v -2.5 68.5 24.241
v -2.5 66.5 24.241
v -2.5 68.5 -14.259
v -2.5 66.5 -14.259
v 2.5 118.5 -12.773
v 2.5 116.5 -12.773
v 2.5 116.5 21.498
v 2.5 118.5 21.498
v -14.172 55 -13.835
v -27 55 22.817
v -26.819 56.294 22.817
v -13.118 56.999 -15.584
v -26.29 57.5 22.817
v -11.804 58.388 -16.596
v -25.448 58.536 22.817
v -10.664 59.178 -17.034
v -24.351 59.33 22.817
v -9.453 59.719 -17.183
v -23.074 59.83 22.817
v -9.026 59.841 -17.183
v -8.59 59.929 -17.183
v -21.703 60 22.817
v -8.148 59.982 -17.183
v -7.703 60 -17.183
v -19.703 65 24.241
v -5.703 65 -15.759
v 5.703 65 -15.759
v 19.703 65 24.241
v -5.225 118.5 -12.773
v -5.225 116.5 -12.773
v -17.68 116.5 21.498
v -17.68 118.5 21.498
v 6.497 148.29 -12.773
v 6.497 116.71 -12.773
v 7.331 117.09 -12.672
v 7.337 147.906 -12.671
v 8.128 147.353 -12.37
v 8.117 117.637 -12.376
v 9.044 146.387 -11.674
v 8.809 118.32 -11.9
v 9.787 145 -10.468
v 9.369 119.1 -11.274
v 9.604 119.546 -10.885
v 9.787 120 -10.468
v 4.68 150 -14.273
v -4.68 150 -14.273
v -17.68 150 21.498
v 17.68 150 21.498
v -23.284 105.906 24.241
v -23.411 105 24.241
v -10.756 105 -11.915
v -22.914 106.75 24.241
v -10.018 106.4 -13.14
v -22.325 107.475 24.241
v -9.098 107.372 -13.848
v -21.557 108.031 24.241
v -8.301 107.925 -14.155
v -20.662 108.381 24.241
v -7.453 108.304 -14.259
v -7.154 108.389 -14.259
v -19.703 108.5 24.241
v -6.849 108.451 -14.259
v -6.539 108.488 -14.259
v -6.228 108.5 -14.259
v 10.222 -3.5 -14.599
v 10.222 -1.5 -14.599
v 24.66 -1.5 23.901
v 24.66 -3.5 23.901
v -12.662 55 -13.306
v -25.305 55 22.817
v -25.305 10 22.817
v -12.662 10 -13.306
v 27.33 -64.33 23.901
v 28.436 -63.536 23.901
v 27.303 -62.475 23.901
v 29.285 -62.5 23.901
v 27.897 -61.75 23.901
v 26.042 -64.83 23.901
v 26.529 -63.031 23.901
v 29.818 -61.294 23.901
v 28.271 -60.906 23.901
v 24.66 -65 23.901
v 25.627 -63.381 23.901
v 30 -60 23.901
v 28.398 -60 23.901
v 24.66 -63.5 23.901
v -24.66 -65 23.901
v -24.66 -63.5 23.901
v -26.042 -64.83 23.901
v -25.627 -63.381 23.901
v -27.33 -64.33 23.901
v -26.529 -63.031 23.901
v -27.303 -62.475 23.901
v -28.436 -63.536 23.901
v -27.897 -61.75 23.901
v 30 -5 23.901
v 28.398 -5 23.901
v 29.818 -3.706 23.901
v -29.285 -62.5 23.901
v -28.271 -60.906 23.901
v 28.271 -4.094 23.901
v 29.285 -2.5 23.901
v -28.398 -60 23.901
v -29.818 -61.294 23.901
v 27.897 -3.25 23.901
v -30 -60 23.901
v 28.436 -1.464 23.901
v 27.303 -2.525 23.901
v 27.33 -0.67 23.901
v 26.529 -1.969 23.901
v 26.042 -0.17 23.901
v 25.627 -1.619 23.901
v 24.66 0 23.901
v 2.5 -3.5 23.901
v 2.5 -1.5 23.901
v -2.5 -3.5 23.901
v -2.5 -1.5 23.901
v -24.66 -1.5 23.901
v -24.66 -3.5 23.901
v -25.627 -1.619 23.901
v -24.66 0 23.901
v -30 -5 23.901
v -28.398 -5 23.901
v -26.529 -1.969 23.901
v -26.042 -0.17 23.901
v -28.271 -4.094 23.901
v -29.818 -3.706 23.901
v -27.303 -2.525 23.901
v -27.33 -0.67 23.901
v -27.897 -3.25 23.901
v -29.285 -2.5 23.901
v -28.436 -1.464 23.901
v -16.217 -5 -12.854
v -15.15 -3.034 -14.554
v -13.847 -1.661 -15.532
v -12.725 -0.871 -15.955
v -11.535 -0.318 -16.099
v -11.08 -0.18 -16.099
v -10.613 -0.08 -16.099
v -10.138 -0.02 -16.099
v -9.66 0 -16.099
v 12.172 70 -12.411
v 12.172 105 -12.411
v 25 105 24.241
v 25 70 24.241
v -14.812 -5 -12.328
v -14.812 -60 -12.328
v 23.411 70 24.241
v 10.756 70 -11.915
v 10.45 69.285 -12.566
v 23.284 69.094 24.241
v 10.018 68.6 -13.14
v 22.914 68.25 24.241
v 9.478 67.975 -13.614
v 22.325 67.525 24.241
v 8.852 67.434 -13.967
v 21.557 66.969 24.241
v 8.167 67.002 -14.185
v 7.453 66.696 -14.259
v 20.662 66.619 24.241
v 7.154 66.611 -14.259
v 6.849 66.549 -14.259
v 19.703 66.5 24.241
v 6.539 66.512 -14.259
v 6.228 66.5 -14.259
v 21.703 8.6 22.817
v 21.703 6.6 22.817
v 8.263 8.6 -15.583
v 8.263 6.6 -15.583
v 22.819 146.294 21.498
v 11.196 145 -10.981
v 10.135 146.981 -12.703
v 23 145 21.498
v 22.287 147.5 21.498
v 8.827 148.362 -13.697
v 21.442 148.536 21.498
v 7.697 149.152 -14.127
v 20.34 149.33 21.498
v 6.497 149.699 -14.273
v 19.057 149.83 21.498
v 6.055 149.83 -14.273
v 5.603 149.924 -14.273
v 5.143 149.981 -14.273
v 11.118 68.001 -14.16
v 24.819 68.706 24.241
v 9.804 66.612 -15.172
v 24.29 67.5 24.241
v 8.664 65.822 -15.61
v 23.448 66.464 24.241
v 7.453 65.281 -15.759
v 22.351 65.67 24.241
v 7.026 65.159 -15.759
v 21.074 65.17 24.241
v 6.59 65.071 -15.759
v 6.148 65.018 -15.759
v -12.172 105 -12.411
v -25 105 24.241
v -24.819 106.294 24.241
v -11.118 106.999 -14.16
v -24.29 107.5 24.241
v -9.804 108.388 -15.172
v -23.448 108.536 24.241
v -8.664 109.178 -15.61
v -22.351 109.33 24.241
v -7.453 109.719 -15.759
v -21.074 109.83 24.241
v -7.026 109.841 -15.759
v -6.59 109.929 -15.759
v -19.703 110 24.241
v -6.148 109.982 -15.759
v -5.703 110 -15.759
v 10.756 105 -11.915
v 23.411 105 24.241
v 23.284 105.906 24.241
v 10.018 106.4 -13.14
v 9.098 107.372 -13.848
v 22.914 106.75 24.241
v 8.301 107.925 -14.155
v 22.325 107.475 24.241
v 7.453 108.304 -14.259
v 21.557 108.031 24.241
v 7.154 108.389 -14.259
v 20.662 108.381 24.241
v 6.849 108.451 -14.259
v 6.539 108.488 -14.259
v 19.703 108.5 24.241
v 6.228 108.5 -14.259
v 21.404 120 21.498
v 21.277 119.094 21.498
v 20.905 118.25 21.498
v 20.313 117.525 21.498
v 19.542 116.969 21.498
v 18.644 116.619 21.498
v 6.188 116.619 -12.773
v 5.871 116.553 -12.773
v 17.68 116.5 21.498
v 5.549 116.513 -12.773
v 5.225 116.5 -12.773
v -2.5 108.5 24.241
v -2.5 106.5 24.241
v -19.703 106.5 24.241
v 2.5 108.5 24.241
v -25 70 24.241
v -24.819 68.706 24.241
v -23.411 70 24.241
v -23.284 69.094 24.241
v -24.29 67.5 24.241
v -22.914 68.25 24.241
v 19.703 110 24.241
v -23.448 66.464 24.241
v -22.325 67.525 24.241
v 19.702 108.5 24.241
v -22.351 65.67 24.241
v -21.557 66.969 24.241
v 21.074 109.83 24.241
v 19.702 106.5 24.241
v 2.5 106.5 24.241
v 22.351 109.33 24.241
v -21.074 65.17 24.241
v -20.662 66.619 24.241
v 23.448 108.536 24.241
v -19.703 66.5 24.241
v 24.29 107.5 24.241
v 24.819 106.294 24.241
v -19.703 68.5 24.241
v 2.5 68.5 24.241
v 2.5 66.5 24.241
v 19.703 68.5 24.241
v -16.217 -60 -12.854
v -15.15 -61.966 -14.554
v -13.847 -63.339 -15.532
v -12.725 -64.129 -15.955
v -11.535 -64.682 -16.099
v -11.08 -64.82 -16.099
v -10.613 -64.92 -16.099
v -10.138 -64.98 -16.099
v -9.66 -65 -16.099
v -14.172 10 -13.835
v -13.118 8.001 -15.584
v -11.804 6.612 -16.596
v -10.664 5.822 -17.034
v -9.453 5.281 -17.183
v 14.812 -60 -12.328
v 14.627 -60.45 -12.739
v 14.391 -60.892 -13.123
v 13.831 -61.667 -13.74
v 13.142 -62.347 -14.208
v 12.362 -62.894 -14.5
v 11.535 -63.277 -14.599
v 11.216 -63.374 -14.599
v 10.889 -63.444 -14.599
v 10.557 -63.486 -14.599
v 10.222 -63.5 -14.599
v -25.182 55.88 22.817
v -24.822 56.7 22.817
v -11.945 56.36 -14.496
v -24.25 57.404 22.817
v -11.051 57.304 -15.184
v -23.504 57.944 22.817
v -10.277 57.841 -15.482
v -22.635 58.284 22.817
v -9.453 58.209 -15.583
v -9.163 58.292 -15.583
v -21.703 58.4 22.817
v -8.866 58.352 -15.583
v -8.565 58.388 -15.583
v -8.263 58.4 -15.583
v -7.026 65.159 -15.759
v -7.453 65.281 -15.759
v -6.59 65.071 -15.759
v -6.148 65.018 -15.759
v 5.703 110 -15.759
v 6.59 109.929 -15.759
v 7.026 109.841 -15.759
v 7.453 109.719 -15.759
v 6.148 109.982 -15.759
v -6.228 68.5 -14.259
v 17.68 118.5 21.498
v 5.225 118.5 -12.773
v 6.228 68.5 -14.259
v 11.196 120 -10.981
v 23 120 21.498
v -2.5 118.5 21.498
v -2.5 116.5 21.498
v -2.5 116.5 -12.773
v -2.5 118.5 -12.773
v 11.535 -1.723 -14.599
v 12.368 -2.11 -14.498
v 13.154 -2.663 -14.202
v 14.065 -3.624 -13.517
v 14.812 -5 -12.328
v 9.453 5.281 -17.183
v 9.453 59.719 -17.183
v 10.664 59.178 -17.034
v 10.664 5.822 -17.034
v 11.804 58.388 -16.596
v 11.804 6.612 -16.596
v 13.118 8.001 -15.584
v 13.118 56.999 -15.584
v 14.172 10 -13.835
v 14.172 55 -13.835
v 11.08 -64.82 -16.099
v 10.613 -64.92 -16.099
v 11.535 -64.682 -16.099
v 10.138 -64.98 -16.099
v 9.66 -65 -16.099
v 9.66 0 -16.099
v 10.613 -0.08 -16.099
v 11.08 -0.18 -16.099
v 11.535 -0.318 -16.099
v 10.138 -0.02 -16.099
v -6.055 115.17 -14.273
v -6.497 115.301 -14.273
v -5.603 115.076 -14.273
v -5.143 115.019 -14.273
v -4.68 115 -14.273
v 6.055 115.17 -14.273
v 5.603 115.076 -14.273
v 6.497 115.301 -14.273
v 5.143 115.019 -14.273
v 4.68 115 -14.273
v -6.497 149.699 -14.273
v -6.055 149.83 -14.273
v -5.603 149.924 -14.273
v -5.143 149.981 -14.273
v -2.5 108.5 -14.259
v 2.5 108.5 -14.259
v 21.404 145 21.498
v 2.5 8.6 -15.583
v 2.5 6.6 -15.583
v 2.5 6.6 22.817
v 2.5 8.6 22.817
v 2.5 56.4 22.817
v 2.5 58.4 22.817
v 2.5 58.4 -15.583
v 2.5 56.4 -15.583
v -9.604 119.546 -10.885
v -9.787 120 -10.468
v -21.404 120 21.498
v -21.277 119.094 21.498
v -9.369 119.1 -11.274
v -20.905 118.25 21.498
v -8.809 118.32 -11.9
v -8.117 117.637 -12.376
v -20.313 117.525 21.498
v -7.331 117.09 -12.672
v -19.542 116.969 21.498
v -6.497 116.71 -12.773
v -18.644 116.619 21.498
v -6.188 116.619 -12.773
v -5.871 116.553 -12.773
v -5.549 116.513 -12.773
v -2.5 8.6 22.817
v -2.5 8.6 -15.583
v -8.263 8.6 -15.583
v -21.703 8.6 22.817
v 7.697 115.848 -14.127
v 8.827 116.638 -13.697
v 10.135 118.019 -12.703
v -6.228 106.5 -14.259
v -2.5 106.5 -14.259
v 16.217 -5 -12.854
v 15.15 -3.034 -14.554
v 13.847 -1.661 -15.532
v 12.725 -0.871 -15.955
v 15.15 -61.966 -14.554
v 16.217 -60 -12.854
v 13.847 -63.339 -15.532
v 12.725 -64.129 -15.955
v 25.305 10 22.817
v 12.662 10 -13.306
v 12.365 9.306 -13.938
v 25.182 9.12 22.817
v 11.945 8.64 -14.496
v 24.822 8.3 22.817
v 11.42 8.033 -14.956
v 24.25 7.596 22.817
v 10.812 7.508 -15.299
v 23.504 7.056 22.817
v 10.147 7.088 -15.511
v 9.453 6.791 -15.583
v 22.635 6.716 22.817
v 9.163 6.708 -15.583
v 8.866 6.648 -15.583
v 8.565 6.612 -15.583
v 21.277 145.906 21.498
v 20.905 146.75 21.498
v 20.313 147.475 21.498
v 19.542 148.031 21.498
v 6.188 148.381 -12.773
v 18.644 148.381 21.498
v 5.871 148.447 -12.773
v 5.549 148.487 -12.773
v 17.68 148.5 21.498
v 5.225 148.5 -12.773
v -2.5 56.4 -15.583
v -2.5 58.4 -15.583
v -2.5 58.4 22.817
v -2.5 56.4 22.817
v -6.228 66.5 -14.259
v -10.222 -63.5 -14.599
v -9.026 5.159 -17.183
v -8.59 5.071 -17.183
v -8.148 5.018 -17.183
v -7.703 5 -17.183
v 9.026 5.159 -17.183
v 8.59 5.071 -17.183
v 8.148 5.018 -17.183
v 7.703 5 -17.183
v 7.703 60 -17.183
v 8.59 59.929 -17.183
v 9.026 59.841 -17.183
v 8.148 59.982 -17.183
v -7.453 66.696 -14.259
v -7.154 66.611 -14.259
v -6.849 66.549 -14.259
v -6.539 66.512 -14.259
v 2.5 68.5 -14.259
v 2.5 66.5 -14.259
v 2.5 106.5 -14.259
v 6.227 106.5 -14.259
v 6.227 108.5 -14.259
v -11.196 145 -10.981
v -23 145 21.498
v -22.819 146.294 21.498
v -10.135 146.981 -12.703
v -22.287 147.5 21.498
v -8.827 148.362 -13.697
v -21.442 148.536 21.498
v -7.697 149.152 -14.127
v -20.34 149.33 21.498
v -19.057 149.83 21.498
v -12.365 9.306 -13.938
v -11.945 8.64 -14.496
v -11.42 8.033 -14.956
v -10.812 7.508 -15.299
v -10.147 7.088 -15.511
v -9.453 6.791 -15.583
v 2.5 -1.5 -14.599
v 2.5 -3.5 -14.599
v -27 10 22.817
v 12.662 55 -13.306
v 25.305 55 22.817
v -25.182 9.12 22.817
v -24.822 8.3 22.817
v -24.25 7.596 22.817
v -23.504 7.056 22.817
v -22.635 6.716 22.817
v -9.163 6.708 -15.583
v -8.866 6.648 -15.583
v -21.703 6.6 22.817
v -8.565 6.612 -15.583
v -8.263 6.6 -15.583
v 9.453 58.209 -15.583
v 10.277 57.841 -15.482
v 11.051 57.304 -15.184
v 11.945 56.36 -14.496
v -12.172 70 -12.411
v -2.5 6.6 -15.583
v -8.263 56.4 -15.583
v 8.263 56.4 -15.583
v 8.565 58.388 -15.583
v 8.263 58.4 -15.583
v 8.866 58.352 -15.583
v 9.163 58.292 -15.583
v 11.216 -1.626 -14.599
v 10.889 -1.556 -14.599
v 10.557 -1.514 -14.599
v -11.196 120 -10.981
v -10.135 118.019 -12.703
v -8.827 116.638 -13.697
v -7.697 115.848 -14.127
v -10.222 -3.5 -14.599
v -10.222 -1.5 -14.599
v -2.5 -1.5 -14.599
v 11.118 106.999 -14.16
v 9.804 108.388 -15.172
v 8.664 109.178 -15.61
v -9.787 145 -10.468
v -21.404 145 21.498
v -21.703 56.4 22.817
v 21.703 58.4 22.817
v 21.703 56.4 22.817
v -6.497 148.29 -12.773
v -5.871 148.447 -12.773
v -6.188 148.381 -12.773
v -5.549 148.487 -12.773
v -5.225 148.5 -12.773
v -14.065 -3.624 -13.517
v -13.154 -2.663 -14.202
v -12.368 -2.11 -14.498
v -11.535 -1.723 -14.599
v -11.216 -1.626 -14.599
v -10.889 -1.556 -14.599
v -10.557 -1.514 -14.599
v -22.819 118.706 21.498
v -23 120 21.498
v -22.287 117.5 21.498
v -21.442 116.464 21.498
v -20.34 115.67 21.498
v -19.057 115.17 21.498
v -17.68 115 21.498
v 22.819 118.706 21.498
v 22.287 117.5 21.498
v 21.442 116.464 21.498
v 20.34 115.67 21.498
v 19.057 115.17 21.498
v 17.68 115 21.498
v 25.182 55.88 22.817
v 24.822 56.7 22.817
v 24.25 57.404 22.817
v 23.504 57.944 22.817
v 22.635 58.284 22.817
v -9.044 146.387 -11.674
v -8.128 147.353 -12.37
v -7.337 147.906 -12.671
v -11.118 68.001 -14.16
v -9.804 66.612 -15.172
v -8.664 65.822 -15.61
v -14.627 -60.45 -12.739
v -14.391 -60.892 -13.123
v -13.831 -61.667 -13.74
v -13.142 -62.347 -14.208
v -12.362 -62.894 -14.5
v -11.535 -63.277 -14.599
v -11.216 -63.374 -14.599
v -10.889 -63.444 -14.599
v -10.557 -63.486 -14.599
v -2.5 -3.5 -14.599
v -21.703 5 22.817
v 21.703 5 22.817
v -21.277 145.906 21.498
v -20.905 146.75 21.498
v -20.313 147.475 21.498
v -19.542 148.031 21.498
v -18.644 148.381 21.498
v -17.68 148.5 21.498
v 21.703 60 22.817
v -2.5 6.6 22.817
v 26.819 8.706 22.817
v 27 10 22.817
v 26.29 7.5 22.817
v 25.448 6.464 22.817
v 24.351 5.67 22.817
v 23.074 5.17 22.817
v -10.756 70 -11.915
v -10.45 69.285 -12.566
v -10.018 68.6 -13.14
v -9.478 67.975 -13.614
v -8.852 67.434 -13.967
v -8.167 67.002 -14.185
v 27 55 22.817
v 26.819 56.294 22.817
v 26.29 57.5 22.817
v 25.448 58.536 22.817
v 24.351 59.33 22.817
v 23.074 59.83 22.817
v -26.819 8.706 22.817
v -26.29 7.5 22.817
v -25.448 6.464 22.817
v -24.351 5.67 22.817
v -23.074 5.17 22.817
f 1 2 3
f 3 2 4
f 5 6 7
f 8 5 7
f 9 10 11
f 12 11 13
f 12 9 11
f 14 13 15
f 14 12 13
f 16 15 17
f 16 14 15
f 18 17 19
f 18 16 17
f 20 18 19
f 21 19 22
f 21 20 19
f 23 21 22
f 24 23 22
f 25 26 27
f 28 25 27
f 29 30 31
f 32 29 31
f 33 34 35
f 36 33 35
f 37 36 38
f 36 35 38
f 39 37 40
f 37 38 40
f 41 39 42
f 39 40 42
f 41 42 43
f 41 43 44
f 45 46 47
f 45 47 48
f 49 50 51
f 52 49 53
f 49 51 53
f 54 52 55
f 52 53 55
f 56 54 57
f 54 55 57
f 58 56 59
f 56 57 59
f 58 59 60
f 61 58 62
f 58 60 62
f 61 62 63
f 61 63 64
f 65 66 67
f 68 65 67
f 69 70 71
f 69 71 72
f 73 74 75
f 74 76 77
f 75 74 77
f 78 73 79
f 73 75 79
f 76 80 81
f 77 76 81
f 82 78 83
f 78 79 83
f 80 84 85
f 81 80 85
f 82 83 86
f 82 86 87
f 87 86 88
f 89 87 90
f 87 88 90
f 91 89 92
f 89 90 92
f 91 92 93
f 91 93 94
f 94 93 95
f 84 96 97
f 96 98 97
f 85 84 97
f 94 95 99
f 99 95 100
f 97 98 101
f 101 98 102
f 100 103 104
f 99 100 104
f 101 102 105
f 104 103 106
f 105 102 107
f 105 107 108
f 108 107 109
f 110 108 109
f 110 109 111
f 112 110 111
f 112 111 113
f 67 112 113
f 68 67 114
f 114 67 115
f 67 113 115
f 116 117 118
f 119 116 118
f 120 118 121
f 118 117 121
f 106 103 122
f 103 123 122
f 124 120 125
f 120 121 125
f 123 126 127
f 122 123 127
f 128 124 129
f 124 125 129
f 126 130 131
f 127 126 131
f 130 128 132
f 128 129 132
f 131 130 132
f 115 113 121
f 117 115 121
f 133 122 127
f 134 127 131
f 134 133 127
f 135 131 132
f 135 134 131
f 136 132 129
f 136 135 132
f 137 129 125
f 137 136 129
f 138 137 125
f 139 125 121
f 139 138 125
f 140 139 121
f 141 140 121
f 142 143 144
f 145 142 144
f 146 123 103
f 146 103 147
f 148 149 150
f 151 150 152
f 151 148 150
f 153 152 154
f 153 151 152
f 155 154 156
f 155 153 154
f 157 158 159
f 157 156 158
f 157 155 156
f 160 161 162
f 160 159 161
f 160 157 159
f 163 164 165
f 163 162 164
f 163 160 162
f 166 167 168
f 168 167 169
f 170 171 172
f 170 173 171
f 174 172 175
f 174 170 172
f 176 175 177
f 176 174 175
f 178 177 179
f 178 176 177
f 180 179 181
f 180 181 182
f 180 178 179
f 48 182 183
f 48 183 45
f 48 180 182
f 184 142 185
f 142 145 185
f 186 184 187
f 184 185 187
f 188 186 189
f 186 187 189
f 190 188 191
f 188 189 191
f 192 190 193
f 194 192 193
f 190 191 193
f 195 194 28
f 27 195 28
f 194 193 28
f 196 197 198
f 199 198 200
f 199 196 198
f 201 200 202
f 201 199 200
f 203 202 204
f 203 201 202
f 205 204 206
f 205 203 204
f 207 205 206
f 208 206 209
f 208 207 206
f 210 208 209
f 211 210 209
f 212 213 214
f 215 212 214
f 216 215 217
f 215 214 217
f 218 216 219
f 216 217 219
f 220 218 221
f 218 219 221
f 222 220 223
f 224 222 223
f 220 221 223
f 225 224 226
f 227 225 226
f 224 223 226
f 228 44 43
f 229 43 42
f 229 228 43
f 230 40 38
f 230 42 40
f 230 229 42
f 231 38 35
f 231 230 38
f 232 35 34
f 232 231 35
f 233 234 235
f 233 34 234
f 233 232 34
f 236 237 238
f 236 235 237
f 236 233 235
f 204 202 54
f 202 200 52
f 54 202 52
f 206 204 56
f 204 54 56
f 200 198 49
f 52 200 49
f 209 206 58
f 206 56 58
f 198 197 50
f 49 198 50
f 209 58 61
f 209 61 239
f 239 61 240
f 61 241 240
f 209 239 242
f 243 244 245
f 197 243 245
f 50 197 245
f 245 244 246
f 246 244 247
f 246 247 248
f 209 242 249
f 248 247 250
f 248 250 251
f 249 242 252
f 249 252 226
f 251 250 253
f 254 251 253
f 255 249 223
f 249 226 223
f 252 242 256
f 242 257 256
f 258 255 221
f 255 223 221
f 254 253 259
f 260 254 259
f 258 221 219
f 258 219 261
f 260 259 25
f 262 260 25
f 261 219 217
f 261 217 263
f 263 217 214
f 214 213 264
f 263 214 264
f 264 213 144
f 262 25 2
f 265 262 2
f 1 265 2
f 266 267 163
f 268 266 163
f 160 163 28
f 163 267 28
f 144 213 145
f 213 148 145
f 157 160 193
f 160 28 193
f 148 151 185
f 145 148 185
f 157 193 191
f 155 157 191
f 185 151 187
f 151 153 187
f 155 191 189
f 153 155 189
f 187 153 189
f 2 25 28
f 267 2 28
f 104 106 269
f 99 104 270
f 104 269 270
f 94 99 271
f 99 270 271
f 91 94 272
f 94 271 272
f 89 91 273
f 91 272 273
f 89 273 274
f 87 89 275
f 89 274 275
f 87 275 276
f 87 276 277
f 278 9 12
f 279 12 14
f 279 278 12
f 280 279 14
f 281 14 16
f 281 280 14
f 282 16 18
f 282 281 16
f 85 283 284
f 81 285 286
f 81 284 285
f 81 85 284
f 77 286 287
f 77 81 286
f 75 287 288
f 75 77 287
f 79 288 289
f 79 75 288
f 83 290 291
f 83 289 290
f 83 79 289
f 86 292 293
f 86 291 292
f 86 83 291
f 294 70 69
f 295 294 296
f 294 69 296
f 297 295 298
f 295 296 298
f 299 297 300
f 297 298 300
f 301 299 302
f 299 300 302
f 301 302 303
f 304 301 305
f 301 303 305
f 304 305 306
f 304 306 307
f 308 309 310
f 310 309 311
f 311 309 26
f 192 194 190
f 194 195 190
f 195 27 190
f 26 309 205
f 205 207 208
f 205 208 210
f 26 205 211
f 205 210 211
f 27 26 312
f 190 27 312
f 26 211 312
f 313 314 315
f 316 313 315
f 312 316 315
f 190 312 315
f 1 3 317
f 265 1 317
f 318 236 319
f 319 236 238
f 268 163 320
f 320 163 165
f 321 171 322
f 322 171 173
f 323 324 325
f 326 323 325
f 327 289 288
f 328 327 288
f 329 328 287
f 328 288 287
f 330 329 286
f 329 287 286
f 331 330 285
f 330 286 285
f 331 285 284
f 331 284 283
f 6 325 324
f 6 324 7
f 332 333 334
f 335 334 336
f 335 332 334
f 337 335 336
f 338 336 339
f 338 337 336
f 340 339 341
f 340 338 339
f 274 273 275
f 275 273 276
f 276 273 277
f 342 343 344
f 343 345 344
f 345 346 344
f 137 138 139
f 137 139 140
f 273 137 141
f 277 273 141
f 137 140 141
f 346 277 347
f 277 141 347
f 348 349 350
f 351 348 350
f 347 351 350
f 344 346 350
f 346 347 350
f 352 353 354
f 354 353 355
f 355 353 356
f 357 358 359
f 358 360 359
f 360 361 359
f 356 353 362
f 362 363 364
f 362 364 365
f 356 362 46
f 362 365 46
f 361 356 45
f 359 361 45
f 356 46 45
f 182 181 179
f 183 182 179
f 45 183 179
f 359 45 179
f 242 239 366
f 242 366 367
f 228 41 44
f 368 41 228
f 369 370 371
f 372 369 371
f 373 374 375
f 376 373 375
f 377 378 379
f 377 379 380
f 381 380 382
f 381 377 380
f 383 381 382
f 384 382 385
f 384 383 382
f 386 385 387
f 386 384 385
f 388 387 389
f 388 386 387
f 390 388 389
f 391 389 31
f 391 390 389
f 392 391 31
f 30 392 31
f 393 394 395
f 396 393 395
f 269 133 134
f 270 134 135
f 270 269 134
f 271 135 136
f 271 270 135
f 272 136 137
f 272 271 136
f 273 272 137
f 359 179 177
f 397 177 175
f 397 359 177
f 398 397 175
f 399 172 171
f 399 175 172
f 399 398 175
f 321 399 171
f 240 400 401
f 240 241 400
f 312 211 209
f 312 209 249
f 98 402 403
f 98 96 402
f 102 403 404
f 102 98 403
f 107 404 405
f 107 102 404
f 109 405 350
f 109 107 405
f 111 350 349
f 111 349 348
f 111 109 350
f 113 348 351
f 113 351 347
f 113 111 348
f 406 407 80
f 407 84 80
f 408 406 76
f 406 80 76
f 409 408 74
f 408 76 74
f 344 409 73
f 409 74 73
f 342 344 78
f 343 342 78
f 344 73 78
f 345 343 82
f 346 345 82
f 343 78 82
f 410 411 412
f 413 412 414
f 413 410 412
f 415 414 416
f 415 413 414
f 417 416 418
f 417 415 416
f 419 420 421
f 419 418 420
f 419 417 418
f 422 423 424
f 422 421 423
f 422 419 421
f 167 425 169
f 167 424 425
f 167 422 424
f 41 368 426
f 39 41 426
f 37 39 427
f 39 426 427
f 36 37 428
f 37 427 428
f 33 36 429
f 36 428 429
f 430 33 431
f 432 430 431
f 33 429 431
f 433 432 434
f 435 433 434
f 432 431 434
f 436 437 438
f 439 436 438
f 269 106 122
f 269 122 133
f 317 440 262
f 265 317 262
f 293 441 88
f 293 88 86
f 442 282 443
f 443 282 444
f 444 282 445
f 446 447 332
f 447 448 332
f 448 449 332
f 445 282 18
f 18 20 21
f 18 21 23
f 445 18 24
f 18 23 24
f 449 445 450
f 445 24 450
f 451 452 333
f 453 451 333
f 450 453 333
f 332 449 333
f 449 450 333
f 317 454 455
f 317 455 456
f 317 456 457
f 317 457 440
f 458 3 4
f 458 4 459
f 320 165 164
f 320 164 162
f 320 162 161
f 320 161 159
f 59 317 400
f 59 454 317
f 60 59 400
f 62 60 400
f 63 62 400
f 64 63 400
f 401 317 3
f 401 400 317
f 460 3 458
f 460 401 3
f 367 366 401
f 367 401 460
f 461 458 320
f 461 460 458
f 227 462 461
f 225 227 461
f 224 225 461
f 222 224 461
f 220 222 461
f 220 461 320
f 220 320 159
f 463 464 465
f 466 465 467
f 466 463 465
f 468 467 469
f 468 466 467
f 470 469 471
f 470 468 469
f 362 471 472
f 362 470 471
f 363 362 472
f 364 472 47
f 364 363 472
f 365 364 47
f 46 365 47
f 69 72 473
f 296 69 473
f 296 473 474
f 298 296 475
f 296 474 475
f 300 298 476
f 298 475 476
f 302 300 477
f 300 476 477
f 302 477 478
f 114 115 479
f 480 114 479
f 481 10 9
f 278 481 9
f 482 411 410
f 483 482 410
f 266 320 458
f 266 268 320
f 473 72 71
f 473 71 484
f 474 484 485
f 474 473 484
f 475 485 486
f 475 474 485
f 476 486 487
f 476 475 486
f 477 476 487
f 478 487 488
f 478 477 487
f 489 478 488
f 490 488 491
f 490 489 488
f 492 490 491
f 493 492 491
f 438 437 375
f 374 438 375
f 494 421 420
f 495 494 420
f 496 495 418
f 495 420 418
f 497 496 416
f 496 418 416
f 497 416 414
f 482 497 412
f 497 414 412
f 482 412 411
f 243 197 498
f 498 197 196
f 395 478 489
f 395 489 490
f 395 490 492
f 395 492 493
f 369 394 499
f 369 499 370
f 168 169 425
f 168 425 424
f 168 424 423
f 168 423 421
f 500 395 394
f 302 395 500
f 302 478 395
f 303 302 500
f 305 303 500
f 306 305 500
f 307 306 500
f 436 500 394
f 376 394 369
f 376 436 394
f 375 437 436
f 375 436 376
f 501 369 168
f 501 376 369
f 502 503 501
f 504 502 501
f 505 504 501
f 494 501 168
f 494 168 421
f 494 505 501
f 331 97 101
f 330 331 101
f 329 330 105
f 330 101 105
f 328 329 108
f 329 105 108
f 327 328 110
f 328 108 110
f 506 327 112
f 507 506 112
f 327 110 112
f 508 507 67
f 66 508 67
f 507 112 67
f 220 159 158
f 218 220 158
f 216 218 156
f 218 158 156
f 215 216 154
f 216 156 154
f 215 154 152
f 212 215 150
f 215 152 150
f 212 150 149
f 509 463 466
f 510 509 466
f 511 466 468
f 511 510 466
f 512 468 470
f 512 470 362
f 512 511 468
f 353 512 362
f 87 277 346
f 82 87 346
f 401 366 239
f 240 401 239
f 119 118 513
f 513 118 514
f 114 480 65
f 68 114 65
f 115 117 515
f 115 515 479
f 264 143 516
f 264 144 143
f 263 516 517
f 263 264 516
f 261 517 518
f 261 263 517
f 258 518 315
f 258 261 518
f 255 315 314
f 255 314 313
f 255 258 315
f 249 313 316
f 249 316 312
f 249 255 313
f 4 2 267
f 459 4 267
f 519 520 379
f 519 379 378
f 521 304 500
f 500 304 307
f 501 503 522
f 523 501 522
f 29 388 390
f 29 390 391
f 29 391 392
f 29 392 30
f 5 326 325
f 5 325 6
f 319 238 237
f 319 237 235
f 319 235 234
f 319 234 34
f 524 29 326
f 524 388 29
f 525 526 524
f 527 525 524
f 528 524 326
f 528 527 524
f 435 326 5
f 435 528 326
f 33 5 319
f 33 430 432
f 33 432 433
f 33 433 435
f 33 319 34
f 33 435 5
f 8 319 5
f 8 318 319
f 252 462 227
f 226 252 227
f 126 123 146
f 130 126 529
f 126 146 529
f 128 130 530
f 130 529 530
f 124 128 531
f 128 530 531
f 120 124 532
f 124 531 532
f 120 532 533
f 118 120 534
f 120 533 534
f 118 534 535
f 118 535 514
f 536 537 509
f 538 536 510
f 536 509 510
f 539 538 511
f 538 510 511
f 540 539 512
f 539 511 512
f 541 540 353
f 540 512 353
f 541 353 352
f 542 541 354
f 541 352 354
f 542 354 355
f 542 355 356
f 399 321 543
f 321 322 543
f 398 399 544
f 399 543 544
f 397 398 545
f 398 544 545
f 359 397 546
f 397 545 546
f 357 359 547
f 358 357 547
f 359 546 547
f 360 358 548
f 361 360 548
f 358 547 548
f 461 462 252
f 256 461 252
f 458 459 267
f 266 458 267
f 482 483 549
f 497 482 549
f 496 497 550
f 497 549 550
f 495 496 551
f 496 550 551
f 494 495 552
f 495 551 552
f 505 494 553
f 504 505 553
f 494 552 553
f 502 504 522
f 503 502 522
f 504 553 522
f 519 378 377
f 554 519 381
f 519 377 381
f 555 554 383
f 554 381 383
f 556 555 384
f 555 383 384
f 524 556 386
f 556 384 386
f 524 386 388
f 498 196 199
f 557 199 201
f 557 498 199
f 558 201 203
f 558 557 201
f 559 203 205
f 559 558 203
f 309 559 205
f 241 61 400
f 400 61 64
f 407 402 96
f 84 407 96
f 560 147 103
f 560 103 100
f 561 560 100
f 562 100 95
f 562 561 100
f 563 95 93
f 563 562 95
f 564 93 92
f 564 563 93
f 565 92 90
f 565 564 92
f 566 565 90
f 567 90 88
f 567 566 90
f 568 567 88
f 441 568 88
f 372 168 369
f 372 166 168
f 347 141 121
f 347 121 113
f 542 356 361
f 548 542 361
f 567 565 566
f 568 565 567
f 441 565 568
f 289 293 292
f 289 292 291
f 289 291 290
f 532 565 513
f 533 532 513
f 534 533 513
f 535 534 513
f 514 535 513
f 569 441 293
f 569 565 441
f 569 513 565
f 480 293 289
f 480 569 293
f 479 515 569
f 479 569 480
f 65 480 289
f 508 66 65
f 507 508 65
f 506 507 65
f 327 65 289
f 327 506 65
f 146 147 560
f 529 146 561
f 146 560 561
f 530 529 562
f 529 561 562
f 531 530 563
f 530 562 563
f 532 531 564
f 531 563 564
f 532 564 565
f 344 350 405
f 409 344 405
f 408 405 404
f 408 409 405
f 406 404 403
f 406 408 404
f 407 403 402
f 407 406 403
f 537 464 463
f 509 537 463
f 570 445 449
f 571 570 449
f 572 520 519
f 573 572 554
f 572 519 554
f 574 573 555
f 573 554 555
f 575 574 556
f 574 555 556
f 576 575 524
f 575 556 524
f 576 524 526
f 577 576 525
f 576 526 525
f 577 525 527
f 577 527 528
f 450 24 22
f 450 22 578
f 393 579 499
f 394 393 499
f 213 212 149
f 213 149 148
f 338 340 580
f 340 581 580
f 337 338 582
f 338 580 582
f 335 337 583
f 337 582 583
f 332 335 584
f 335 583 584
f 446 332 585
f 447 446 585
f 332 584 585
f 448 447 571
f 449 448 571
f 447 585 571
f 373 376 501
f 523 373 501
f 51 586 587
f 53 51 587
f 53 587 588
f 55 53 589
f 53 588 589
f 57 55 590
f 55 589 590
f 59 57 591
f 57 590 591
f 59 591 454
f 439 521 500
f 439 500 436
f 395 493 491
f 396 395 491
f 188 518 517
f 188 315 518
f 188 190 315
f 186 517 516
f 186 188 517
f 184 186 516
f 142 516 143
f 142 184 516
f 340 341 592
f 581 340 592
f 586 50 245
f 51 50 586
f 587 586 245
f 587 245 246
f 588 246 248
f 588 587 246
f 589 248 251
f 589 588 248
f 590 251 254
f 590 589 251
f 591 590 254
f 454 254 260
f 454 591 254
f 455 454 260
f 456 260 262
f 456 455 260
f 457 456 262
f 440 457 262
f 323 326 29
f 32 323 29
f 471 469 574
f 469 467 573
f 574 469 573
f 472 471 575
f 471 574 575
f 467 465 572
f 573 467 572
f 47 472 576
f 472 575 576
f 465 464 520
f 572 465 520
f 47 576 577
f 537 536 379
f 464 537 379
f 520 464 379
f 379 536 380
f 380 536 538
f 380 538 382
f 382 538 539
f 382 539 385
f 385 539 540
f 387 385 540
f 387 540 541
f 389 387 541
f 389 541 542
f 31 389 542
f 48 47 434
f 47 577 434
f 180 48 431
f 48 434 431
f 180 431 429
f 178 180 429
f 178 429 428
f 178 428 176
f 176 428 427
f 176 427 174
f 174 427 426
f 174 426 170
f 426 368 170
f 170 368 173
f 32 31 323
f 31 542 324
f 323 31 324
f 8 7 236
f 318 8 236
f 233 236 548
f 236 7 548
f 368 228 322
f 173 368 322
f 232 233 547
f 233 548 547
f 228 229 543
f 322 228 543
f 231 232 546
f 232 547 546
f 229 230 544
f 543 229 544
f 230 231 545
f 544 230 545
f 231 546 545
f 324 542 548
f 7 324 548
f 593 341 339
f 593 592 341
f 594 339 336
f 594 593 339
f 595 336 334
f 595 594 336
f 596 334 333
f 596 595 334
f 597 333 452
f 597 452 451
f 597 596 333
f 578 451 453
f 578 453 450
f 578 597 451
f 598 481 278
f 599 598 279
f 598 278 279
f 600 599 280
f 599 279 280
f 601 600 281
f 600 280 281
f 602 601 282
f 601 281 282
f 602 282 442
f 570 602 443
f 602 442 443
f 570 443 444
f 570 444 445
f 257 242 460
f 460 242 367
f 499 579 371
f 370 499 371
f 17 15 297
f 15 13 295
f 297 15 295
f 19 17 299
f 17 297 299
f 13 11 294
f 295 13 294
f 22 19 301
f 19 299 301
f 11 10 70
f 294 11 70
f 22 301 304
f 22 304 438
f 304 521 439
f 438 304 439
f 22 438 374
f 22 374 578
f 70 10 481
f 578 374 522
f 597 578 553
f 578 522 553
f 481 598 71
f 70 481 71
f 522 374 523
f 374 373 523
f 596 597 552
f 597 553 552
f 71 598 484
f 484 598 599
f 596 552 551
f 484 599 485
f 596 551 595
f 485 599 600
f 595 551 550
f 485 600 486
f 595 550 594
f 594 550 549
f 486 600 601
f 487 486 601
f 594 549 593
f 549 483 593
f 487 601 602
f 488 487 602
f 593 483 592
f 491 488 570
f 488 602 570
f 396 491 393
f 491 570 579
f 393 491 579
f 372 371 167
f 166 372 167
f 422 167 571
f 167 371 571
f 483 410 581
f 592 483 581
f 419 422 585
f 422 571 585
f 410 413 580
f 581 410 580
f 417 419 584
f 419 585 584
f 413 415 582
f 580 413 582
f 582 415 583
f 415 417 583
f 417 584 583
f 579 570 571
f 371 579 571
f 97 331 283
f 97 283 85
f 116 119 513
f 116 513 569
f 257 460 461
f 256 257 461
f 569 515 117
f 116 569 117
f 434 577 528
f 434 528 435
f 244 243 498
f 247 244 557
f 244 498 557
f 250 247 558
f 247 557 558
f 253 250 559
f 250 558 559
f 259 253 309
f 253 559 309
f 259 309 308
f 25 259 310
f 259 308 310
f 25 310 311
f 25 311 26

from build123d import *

# Parameters (mm, degrees)
F1_DEPTH  = 65
F2_R      = 5
F5_DEPTH  = 55
F6_R      = 5
F9_DEPTH  = 45
F10_R     = 5
F13_DEPTH = 35
F14_R     = 5
F15_T     = -1.6
F16_T     = -1.5
F17_T     = -1.5
F18_T     = -1.5
F20_DEPTH = 2
F22_DEPTH = 2
F24_DEPTH = 2
F26_DEPTH = 2
F28_DEPTH = 2
F30_DEPTH = 2


with BuildPart() as f1:
    # F0 (on Front) → F1 (new body)
    with BuildSketch(Plane.XZ):
        Polygon((30, 23.901118), (0, 23.901118), (-30, 23.901118), (-15, -16.098882), (0, -16.098882), (15, -16.098882), align=None)
    extrude(amount=F1_DEPTH)

    # F2
    f2_edges = [f1.edges().sort_by_distance(p)[0] for p in [
        (-15, -32.5, -16.098882),
        (15, -32.5, -16.098882),
        (-22.5, -65, 3.901118),
        (22.5, -65, 3.901118),
        (22.5, 0, 3.901118),
        (-22.5, 0, 3.901118),
    ]]
    fillet(f2_edges, radius=F2_R)

    # F17
    f17_openings = [f1.faces().sort_by_distance(p)[0] for p in [
        (0, -32.5, 23.901118),
    ]]
    offset(amount=F17_T, openings=f17_openings)

    # F29 (on face) → F30 (join)
    with BuildSketch(Plane.XZ.offset(1.5)):
        Polygon((-2.5, -14.598882), (-2.5, 23.901118), (-24.659998, 23.901118), (-10.222498, -14.598882), align=None)
        Polygon((24.659998, 23.901118), (2.5, 23.901118), (2.5, -14.598882), (10.222498, -14.598882), align=None)
    extrude(amount=F30_DEPTH)


with BuildPart() as f5:
    # F4 (on offset) → F5 (new body)
    with BuildSketch(Plane.XZ.offset(-60)):
        Polygon((27, 22.816903), (0, 22.816903), (-27, 22.816903), (-13, -17.183097), (0, -17.183097), (13, -17.183097), align=None)
    extrude(amount=F5_DEPTH)

    # F6
    f6_edges = [f5.edges().sort_by_distance(p)[0] for p in [
        (20, 60, 2.816903),
        (-20, 60, 2.816903),
        (13, 32.5, -17.183097),
        (-13, 32.5, -17.183097),
        (-20, 5, 2.816903),
        (20, 5, 2.816903),
    ]]
    fillet(f6_edges, radius=F6_R)

    # F15
    f15_openings = [f5.faces().sort_by_distance(p)[0] for p in [
        (0, 32.5, 22.816903),
    ]]
    offset(amount=F15_T, openings=f15_openings)

    # F25 (on face) → F26 (join)
    with BuildSketch(Plane.XZ.offset(-58.4)):
        Polygon((-2.5, -15.583097), (-2.5, 22.816903), (-21.702595, 22.816903), (-8.262595, -15.583097), align=None)
        Polygon((21.702595, 22.816903), (2.5, 22.816903), (2.5, -15.583097), (8.262595, -15.583097), align=None)
    extrude(amount=F26_DEPTH)

    # F27 (on face) → F28 (join)
    with BuildSketch(Plane(origin=(0, 6.6, 0), x_dir=(-1, 0, 0), z_dir=(0, 1, 0))):
        Polygon((2.5, 22.816903), (2.5, -15.583097), (8.262595, -15.583097), (21.702595, 22.816903), align=None)
        Polygon((-8.262595, -15.583097), (-2.5, -15.583097), (-2.5, 22.816903), (-21.702595, 22.816903), align=None)
    extrude(amount=F28_DEPTH)


with BuildPart() as f9:
    # F8 (on offset) → F9 (new body)
    with BuildSketch(Plane.XZ.offset(-110)):
        Polygon((25, 24.240877), (0, 24.240877), (-25, 24.240877), (-11, -15.759123), (0, -15.759123), (11, -15.759123), align=None)
    extrude(amount=F9_DEPTH)

    # F10
    f10_edges = [f9.edges().sort_by_distance(p)[0] for p in [
        (18, 110, 4.240877),
        (-18, 110, 4.240877),
        (11, 87.5, -15.759123),
        (-11, 87.5, -15.759123),
        (18, 65, 4.240877),
        (-18, 65, 4.240877),
    ]]
    fillet(f10_edges, radius=F10_R)

    # F18
    f18_openings = [f9.faces().sort_by_distance(p)[0] for p in [
        (0, 87.5, 24.240877),
    ]]
    offset(amount=F18_T, openings=f18_openings)

    # F19 (on face) → F20 (join)
    with BuildSketch(Plane.XZ.offset(-108.5)):
        Polygon((2.49981, 24.240877), (2.49981, -14.259123), (6.227405, -14.259123), (19.702405, 24.240877), align=None)
        Polygon((-6.227595, -14.259123), (-2.5, -14.259123), (-2.5, 24.240877), (-19.702595, 24.240877), align=None)
    extrude(amount=F20_DEPTH)

    # F21 (on face) → F22 (join)
    with BuildSketch(Plane(origin=(0, 66.5, 0), x_dir=(-1, 0, 0), z_dir=(0, 1, 0))):
        Polygon((-6.227595, -14.259123), (-2.5, -14.259123), (-2.5, 24.240877), (-19.702595, 24.240877), align=None)
        Polygon((2.5, -14.259123), (6.227595, -14.259123), (19.702595, 24.240877), (2.5, 24.240877), align=None)
    extrude(amount=F22_DEPTH)


with BuildPart() as f13:
    # F12 (on offset) → F13 (new body)
    with BuildSketch(Plane.XZ.offset(-150)):
        Polygon((23, 21.498091), (0, 21.498091), (-23, 21.498091), (-10, -14.272978), (0, -14.272978), (10, -14.272978), align=None)
    extrude(amount=F13_DEPTH)

    # F14
    f14_edges = [f13.edges().sort_by_distance(p)[0] for p in [
        (16.5, 150, 3.612557),
        (-16.5, 150, 3.612557),
        (10, 132.5, -14.272978),
        (-10, 132.5, -14.272978),
        (16.5, 115, 3.612557),
        (-16.5, 115, 3.612557),
    ]]
    fillet(f14_edges, radius=F14_R)

    # F16
    f16_openings = [f13.faces().sort_by_distance(p)[0] for p in [
        (0, 132.5, 21.498091),
    ]]
    offset(amount=F16_T, openings=f16_openings)

    # F23 (on face) → F24 (join)
    with BuildSketch(Plane(origin=(0, 116.5, 0), x_dir=(-1, 0, 0), z_dir=(0, 1, 0))):
        Polygon((-5.225181, -12.772978), (-2.5, -12.772978), (-2.5, 21.498091), (-17.680048, 21.498091), align=None)
        Polygon((2.5, 21.498091), (2.5, -12.772978), (5.225181, -12.772978), (17.680048, 21.498091), align=None)
    extrude(amount=F24_DEPTH)


solid = Compound([f1.part, f5.part, f9.part, f13.part])
